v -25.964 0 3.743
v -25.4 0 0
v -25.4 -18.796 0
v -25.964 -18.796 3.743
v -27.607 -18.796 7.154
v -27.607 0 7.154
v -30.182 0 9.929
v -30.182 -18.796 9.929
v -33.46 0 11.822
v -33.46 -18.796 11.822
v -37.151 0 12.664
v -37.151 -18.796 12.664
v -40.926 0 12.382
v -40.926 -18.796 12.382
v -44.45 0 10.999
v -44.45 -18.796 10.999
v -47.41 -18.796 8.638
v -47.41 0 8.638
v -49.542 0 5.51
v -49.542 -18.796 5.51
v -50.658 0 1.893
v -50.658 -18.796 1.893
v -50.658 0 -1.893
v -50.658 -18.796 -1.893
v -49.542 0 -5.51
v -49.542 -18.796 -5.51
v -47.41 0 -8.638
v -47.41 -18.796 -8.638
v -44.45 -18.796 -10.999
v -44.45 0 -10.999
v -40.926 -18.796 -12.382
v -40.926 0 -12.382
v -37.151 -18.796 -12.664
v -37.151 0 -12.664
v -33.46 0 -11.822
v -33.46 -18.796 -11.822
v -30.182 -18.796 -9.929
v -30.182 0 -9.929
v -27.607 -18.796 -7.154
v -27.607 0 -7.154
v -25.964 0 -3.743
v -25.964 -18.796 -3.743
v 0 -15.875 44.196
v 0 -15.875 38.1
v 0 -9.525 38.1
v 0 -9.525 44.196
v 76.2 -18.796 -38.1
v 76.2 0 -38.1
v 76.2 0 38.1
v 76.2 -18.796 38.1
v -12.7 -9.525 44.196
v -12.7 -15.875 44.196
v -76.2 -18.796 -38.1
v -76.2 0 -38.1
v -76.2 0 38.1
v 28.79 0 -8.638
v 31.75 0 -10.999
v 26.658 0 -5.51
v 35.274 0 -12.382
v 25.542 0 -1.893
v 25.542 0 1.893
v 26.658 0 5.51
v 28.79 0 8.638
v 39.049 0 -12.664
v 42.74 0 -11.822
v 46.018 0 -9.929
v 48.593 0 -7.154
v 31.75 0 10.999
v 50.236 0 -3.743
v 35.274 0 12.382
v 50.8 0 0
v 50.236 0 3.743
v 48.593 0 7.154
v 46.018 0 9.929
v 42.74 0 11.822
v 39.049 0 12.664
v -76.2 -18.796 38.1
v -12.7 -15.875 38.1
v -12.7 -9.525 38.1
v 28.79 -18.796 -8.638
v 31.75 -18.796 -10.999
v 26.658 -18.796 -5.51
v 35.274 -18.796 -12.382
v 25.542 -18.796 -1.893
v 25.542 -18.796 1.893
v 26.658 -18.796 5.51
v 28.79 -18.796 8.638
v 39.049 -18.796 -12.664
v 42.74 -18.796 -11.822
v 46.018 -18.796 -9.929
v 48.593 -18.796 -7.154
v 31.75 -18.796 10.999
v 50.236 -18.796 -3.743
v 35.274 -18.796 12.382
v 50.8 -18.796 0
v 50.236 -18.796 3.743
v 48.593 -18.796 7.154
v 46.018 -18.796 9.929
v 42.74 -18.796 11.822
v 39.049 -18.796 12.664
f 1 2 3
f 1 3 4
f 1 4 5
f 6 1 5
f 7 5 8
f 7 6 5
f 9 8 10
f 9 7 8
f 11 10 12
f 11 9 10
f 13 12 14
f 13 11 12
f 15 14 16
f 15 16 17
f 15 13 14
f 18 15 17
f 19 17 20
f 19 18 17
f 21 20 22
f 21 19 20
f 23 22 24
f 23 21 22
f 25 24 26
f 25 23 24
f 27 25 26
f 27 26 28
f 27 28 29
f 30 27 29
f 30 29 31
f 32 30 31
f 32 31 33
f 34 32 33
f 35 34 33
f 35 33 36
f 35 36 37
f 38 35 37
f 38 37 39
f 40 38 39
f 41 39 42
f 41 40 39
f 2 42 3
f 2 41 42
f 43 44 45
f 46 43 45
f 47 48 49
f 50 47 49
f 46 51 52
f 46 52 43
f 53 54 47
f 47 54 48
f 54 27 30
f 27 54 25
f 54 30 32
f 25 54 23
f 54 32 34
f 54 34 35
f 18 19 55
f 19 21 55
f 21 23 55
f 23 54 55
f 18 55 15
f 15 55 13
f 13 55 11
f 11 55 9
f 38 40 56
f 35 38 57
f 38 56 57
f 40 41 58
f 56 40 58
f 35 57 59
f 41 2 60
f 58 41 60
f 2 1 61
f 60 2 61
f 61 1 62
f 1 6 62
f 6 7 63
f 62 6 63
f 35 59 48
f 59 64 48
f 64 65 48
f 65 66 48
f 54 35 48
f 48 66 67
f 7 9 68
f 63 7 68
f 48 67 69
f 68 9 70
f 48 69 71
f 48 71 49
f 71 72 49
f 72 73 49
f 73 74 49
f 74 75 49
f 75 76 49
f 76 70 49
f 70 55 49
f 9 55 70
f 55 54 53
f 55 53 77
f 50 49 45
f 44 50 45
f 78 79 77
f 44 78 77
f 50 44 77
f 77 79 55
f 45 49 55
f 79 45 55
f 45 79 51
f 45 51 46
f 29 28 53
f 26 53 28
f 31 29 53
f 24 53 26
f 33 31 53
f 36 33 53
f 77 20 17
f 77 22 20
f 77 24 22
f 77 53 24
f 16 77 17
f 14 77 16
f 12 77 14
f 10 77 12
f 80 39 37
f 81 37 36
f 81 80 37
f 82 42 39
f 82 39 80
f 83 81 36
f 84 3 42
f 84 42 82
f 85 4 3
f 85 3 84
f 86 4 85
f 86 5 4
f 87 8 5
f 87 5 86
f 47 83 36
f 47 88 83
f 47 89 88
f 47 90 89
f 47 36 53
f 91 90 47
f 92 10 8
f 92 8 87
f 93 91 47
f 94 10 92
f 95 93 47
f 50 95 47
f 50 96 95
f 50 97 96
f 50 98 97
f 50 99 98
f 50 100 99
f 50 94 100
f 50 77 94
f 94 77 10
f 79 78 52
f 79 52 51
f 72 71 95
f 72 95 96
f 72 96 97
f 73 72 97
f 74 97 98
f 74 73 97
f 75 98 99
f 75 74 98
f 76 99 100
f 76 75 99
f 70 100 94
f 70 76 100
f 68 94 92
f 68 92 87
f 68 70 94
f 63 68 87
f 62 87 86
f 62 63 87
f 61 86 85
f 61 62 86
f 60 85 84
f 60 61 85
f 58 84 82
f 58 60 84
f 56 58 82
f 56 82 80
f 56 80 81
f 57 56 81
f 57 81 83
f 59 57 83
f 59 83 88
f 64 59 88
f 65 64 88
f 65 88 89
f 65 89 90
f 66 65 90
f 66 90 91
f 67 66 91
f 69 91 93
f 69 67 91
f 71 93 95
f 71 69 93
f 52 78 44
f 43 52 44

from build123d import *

# Parameters (mm, degrees)
F0_W     = 76.2
F0_H     = 76.2
F0_R     = 12.7
F2_DEPTH = 18.796
F1_W     = 12.7
F1_H     = 6.35
F3_DEPTH = 44.196


with BuildPart() as f2:
    # F0 (on Front) → F2 (new body)
    with BuildSketch(Plane.XZ):
        with Locations((38.1, 0)):
            Rectangle(F0_W, F0_H)
        with Locations((38.1, 0)):
            Circle(F0_R, mode=Mode.SUBTRACT)
        with Locations((-38.1, 0)):
            Rectangle(F0_W, F0_H)
        with Locations((-38.1, 0)):
            Circle(F0_R, mode=Mode.SUBTRACT)
    extrude(amount=F2_DEPTH)

    # F1 (on Top) → F3 (join)
    with BuildSketch(Plane.XY):
        with Locations((-6.35, -12.7)):
            Rectangle(F1_W, F1_H)
    extrude(amount=F3_DEPTH)


solid = f2.part
